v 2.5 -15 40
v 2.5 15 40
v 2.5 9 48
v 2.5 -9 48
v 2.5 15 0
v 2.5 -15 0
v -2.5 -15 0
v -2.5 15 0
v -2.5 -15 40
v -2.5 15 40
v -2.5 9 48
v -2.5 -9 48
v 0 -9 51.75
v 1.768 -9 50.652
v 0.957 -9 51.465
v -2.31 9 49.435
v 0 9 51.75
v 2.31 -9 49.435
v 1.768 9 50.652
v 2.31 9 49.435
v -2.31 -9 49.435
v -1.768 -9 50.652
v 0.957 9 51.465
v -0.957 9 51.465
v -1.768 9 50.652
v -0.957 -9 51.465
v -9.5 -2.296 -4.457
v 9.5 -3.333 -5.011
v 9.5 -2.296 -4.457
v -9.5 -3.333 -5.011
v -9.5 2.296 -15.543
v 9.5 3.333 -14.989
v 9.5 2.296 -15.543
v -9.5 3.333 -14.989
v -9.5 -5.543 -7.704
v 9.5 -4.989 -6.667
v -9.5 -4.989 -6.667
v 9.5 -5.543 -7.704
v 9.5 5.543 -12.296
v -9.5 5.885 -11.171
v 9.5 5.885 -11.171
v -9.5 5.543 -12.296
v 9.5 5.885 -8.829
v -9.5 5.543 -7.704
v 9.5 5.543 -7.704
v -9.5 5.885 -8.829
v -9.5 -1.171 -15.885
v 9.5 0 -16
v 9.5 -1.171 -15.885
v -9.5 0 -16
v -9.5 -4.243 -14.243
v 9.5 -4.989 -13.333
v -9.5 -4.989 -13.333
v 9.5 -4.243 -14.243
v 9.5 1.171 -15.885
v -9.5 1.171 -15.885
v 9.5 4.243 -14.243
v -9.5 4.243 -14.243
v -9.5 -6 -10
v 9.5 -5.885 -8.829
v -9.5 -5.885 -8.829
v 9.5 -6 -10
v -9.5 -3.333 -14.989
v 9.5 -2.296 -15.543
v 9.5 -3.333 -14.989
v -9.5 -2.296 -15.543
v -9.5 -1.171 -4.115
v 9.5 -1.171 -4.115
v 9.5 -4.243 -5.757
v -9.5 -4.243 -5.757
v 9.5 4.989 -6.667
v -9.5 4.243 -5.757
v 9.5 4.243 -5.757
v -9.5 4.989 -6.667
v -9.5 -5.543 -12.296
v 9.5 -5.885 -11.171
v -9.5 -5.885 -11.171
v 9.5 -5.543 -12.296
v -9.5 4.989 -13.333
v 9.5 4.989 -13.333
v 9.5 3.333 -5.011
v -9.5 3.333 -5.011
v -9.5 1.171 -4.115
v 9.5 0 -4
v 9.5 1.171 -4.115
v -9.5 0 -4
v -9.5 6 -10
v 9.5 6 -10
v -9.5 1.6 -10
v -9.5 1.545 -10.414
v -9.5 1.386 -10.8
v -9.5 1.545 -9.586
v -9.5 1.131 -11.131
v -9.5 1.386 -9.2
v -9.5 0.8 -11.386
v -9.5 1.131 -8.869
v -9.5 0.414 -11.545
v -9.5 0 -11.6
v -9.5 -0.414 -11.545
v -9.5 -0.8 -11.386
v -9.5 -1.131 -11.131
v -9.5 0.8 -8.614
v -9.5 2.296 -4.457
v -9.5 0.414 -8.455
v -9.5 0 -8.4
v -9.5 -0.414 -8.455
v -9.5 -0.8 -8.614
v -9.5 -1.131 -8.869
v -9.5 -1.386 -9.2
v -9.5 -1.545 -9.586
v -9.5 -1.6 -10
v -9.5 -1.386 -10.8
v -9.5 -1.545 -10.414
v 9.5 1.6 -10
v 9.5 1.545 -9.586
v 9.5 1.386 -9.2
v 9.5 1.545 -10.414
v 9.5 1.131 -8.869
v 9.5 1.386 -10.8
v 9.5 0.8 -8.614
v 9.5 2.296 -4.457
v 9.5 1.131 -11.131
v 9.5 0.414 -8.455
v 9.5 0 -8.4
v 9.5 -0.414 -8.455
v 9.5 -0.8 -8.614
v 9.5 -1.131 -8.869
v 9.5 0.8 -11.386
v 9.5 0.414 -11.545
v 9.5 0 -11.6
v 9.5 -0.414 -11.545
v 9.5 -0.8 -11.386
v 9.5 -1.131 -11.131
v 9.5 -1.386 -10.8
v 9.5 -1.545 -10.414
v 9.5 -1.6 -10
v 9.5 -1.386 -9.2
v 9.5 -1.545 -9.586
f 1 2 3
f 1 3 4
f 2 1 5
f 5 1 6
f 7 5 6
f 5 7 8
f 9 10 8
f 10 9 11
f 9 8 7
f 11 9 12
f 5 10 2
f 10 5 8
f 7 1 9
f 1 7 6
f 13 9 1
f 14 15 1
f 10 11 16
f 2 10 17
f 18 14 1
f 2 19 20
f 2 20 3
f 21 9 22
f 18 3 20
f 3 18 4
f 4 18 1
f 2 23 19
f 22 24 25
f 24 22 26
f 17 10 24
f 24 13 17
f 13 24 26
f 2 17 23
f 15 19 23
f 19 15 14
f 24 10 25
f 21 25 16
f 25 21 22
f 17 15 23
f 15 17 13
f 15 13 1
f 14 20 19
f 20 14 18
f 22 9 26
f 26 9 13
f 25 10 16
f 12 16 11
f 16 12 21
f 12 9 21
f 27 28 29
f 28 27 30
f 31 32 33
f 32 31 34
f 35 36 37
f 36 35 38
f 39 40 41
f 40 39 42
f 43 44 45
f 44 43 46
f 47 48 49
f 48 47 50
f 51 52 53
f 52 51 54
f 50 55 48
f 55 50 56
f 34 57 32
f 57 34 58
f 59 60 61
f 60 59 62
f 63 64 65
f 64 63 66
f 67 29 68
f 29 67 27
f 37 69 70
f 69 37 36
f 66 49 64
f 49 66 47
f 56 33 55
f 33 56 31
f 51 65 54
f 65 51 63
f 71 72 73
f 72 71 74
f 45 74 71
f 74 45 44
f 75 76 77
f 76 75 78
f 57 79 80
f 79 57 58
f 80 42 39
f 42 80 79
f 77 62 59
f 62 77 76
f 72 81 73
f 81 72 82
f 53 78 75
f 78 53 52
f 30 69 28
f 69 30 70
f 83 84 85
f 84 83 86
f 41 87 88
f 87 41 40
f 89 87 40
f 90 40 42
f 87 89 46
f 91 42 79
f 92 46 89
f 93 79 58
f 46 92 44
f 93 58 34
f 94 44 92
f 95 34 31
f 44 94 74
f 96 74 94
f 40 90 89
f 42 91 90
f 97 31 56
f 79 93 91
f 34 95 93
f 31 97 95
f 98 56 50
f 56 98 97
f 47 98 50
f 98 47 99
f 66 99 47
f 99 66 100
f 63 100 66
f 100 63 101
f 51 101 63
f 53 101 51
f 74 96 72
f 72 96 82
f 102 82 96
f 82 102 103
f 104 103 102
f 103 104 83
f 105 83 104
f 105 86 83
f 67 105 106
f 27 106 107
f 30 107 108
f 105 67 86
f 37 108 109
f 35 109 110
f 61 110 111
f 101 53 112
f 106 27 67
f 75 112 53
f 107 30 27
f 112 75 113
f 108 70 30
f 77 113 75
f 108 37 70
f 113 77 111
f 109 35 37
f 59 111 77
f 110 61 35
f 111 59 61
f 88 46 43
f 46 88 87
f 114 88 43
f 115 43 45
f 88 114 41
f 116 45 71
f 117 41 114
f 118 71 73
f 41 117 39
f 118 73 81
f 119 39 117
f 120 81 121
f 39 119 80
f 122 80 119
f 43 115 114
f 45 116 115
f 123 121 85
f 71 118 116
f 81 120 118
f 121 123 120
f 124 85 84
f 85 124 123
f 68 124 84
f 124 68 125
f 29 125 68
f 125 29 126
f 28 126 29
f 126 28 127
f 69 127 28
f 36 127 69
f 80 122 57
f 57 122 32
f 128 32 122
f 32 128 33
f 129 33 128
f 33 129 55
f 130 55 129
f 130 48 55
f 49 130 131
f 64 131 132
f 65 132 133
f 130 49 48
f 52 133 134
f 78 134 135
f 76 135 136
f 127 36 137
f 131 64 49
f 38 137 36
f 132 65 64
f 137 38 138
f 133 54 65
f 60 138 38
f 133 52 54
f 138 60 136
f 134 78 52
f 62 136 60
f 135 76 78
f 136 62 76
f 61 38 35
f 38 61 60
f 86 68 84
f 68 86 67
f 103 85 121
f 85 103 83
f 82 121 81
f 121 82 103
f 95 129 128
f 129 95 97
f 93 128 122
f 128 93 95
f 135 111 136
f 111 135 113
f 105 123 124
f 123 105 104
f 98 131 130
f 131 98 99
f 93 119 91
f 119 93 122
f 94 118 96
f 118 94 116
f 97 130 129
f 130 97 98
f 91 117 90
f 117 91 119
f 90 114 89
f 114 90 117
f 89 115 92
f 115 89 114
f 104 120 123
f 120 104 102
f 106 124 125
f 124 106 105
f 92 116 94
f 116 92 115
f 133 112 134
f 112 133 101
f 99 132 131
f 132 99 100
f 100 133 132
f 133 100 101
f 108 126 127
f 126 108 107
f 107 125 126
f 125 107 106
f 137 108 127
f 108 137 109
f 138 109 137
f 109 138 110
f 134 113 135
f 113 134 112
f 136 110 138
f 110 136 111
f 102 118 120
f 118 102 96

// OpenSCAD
// file: ../common.scad
/*
 * WAVE OCEAN V10 - COMMON PARAMETERS
 *
 * Shared constants, tolerances, and hardware specifications
 * All dimensions in mm
 *
 * MECHANISM: Helical groove cam drives 24 slats via follower arms
 * - Worm rotates around X axis
 * - Groove follows helix at radius GROOVE_RADIUS
 * - Follower rollers ride in groove, push slats up/down
 * - Phase difference along X creates traveling wave illusion
 */

// ============================================
// PRINT TOLERANCES (tune for your printer)
// ============================================

TOL_CLEARANCE = 0.2;         // Shaft in hole clearance
TOL_PRESS_FIT = -0.15;       // Bearing press-fit interference
TOL_SLIDING = 0.4;           // Sliding fit (guide slots)
TOL_SCREW_HOLE = 0.2;        // Screw hole clearance

// ============================================
// HARDWARE - BEARINGS
// ============================================

// 608 bearing (worm shaft)
BEARING_608_ID = 8;
BEARING_608_OD = 22;
BEARING_608_H = 7;

// 624 bearing (follower rollers)
BEARING_624_ID = 4;
BEARING_624_OD = 13;
BEARING_624_H = 5;

// ============================================
// HARDWARE - FASTENERS
// ============================================

M3_HOLE_DIA = 3 + TOL_SCREW_HOLE;      // 3.2mm
M3_HEAD_DIA = 5.5;
M3_HEAD_H = 3;
M3_NUT_FLAT = 5.5;
M3_NUT_H = 2.4;
M3_INSERT_DIA = 4.0;                    // Heat-set insert hole
M3_INSERT_DEPTH = 5;

// ============================================
// HARDWARE - SHAFTS AND PINS
// ============================================

WORM_SHAFT_DIA = 8;
WORM_SHAFT_LENGTH = 280;               // Extends beyond worm for bearings

ROLLER_AXLE_DIA = 4;
ROLLER_AXLE_LENGTH = 12;

PIVOT_PIN_DIA = 3;
PIVOT_PIN_LENGTH = 15;

// ============================================
// WORM CAM DIMENSIONS
// ============================================

WORM_LENGTH = 200;
WORM_OUTER_RADIUS = 20;              // 40mm diameter (bigger for deeper groove)
WORM_CORE_RADIUS = 10;               // 20mm diameter core
WORM_SHAFT_HOLE = WORM_SHAFT_DIA + TOL_CLEARANCE;  // 8.2mm

// Groove sized to contain 624 bearing roller
GROOVE_WIDTH = BEARING_624_H + 2;    // 7mm wide (bearing + clearance)
GROOVE_DEPTH = BEARING_624_OD/2 + 3; // 9.5mm deep (half bearing + margin)
GROOVE_RADIUS = WORM_OUTER_RADIUS - GROOVE_DEPTH/2;  // ~15mm from center

HELIX_PITCH = 25;                    // 25mm per rotation = 8 turns over 200mm

// ============================================
// SLAT DIMENSIONS
// ============================================

NUM_SLATS = 24;
SLAT_SPACING = WORM_LENGTH / NUM_SLATS;  // 8.33mm

SLAT_WIDTH = 5;                       // X dimension (slightly wider)
SLAT_DEPTH = 30;                      // Y dimension (narrower)
SLAT_HEIGHT = 40;                     // Z dimension

// Wave motion amplitude (half of total travel)
WAVE_AMPLITUDE = 10;                  // ±10mm vertical motion

// ============================================
// FOLLOWER ARM DIMENSIONS
// ============================================

ARM_LENGTH = 35;                      // Pivot to roller center (LONGER)
ARM_WIDTH = 8;
ARM_THICKNESS = 6;

PIVOT_HOLE = PIVOT_PIN_DIA + TOL_CLEARANCE;    // 3.2mm
ROLLER_AXLE_HOLE = ROLLER_AXLE_DIA + TOL_CLEARANCE;  // 4.2mm

// ============================================
// SLAT BRACKET DIMENSIONS
// ============================================

BRACKET_WIDTH = 12;
BRACKET_DEPTH = 20;
BRACKET_HEIGHT = 25;

// ============================================
// GUIDE RAIL DIMENSIONS
// ============================================

GUIDE_LENGTH = 210;
GUIDE_HEIGHT = 30;                    // Taller for more travel
GUIDE_DEPTH = 10;
GUIDE_WALL = 3;

SLOT_WIDTH = SLAT_WIDTH + TOL_SLIDING;   // Slat slides in slot, not bracket tab
SLOT_HEIGHT = WAVE_AMPLITUDE * 2 + 10;   // Allow full travel + margin

// ============================================
// BEARING BLOCK DIMENSIONS
// ============================================

BEARING_BLOCK_WIDTH = 35;
BEARING_BLOCK_DEPTH = 35;
BEARING_BLOCK_HEIGHT = 30;

BEARING_POCKET_DIA = BEARING_608_OD + TOL_PRESS_FIT;  // 21.85mm
BEARING_POCKET_DEPTH = BEARING_608_H + 1;             // 8mm

// ============================================
// BASE PLATE DIMENSIONS
// ============================================

BASE_LENGTH = 280;                    // Longer to fit everything
BASE_WIDTH = 100;                     // Wider for stability
BASE_THICKNESS = 5;

// ============================================
// MOTOR MOUNT DIMENSIONS
// ============================================

N20_BODY_DIA = 12;
N20_BODY_LENGTH = 15;
N20_GEARBOX_DIA = 10;
N20_GEARBOX_LENGTH = 12;
N20_SHAFT_DIA = 3;
N20_SHAFT_LENGTH = 10;

// ============================================
// ASSEMBLY POSITIONS
// ============================================

// Worm center position
// Shaft runs along X axis at this Z height
WORM_CENTER_Z = BASE_THICKNESS + BEARING_BLOCK_HEIGHT;  // 35mm

// Guide rail positions (front and back of slats)
// Slats are centered at Y=0, spanning ±SLAT_DEPTH/2
GUIDE_FRONT_Y = -SLAT_DEPTH/2 - GUIDE_DEPTH/2;   // -20
GUIDE_BACK_Y = SLAT_DEPTH/2 + GUIDE_DEPTH/2;     // +20

// Guide rail Z - slats hang down from here
// Positioned so slat bottom can reach groove at top of worm
GUIDE_Z = WORM_CENTER_Z + WORM_OUTER_RADIUS + SLAT_HEIGHT/2 + 5;  // 80mm

// Bearing block X positions (at ends of worm, inward facing)
BEARING_L_X = -WORM_LENGTH/2 - BEARING_BLOCK_WIDTH/2;   // -117.5
BEARING_R_X = WORM_LENGTH/2 + BEARING_BLOCK_WIDTH/2;    // +117.5

// Motor mount X position (beyond right bearing block)
MOTOR_MOUNT_X = BEARING_R_X + BEARING_BLOCK_WIDTH/2 + 30;

// ============================================
// COLORS (for assembly visualization)
// ============================================

C_WORM = [0.75, 0.55, 0.2];
C_SLAT = [0.2, 0.45, 0.75];
C_BRACKET = [0.4, 0.4, 0.45];
C_ARM = [0.5, 0.5, 0.55];
C_GUIDE = [0.35, 0.35, 0.4];
C_BEARING_BLOCK = [0.3, 0.35, 0.4];
C_BASE = [0.25, 0.25, 0.3];
C_SHAFT = [0.6, 0.6, 0.65];
C_BEARING = [0.7, 0.7, 0.75];
C_MOTOR = [0.3, 0.3, 0.35];

// ============================================
// HELPER FUNCTIONS
// ============================================

// Helix angle at position X along worm (in degrees)
function helix_angle(x) = (x / HELIX_PITCH) * 360;

// Combined phase: helix position + shaft rotation
function phase(x, theta) = helix_angle(x) + theta;

// Groove center position in Y-Z plane (polar coordinates from shaft)
// Y = radius * sin(angle), Z = center + radius * cos(angle)
function groove_y(x, theta) = GROOVE_RADIUS * sin(phase(x, theta));
function groove_z(x, theta) = WORM_CENTER_Z + GROOVE_RADIUS * cos(phase(x, theta));

// Slat X position (evenly spaced along worm length)
function slat_x(i) = i * SLAT_SPACING - WORM_LENGTH/2 + SLAT_SPACING/2;

// Slat Z position - follows groove Z position via follower arm
// When groove is at top (cos=1), slat is pushed up
// When groove is at bottom (cos=-1), slat drops down
function slat_z(i, theta) =
    let(x = slat_x(i))
    GUIDE_Z + GROOVE_RADIUS * cos(phase(x, theta)) - GROOVE_RADIUS;

// ============================================
// CLEARANCE VERIFICATION
// ============================================

// Slat gap: SLAT_SPACING - SLAT_WIDTH = 8.33 - 5 = 3.33mm ✓
// Arm reach: ARM_LENGTH = 35mm, needs to reach ~30mm ✓
// Groove depth: 9.5mm, bearing radius 6.5mm ✓
// Wave travel: ±GROOVE_RADIUS * cos variation = ±15mm

// ============================================
// QUALITY SETTINGS
// ============================================

$fn = 48;  // Default facets
// main file
/*
 * SLAT - Wave Profile Piece
 *
 * Printable part: 24x
 * Print orientation: Flat on back (Y face down)
 *
 * Features:
 * - Wave crest profile at top
 * - Slides directly in guide rail slots
 * - Follower arm pivot mount at bottom
 */

include <../common.scad>

$fn = 32;

// ============================================
// MAIN SLAT MODULE
// ============================================

module slat() {
    difference() {
        union() {
            // Main body
            slat_body();

            // Pivot mount for follower arm
            pivot_mount();
        }

        // Pivot pin hole
        pivot_hole();
    }
}

// ============================================
// SLAT BODY
// ============================================

module slat_body() {
    // Simple rectangular body that slides in guide rail slots
    // Wave profile at top is decorative

    // Main body
    translate([-SLAT_WIDTH/2, -SLAT_DEPTH/2, 0])
        cube([SLAT_WIDTH, SLAT_DEPTH, SLAT_HEIGHT]);

    // Tapered wave crest at top
    hull() {
        // Top of main body
        translate([-SLAT_WIDTH/2, -SLAT_DEPTH/2, SLAT_HEIGHT - 1])
            cube([SLAT_WIDTH, SLAT_DEPTH, 1]);

        // Crest peak (narrower, rounded)
        translate([0, 0, SLAT_HEIGHT + 8])
        rotate([90, 0, 0])
        scale([1, 1.5, 1])
            cylinder(d=SLAT_WIDTH, h=SLAT_DEPTH * 0.6, center=true, $fn=16);
    }
}

// ============================================
// PIVOT MOUNT
// ============================================

module pivot_mount() {
    // Boss at bottom of slat for follower arm pivot
    // Pivot axis is along X (allows arm to swing in Y-Z plane)

    pivot_boss_dia = 12;
    pivot_boss_len = PIVOT_PIN_LENGTH + 4;

    // Boss extends in +/- X from slat
    translate([0, 0, -10])
    rotate([0, 90, 0])
        cylinder(d=pivot_boss_dia, h=pivot_boss_len, center=true);
}

// ============================================
// PIVOT HOLE
// ============================================

module pivot_hole() {
    // Through hole for pivot pin (3mm)
    translate([0, 0, -10])
    rotate([0, 90, 0])
        cylinder(d=PIVOT_HOLE, h=30, center=true, $fn=24);
}

// ============================================
// RENDER
// ============================================

color(C_SLAT)
slat();

// ============================================
// INFO
// ============================================

echo("=== SLAT ===");
echo(str("Width: ", SLAT_WIDTH, "mm"));
echo(str("Depth: ", SLAT_DEPTH, "mm"));
echo(str("Height: ", SLAT_HEIGHT, "mm"));
echo("");
echo("Print quantity: 24");
echo("Print orientation: Flat on side");
echo("Assembly: Insert pivot pin, attach follower arm");
